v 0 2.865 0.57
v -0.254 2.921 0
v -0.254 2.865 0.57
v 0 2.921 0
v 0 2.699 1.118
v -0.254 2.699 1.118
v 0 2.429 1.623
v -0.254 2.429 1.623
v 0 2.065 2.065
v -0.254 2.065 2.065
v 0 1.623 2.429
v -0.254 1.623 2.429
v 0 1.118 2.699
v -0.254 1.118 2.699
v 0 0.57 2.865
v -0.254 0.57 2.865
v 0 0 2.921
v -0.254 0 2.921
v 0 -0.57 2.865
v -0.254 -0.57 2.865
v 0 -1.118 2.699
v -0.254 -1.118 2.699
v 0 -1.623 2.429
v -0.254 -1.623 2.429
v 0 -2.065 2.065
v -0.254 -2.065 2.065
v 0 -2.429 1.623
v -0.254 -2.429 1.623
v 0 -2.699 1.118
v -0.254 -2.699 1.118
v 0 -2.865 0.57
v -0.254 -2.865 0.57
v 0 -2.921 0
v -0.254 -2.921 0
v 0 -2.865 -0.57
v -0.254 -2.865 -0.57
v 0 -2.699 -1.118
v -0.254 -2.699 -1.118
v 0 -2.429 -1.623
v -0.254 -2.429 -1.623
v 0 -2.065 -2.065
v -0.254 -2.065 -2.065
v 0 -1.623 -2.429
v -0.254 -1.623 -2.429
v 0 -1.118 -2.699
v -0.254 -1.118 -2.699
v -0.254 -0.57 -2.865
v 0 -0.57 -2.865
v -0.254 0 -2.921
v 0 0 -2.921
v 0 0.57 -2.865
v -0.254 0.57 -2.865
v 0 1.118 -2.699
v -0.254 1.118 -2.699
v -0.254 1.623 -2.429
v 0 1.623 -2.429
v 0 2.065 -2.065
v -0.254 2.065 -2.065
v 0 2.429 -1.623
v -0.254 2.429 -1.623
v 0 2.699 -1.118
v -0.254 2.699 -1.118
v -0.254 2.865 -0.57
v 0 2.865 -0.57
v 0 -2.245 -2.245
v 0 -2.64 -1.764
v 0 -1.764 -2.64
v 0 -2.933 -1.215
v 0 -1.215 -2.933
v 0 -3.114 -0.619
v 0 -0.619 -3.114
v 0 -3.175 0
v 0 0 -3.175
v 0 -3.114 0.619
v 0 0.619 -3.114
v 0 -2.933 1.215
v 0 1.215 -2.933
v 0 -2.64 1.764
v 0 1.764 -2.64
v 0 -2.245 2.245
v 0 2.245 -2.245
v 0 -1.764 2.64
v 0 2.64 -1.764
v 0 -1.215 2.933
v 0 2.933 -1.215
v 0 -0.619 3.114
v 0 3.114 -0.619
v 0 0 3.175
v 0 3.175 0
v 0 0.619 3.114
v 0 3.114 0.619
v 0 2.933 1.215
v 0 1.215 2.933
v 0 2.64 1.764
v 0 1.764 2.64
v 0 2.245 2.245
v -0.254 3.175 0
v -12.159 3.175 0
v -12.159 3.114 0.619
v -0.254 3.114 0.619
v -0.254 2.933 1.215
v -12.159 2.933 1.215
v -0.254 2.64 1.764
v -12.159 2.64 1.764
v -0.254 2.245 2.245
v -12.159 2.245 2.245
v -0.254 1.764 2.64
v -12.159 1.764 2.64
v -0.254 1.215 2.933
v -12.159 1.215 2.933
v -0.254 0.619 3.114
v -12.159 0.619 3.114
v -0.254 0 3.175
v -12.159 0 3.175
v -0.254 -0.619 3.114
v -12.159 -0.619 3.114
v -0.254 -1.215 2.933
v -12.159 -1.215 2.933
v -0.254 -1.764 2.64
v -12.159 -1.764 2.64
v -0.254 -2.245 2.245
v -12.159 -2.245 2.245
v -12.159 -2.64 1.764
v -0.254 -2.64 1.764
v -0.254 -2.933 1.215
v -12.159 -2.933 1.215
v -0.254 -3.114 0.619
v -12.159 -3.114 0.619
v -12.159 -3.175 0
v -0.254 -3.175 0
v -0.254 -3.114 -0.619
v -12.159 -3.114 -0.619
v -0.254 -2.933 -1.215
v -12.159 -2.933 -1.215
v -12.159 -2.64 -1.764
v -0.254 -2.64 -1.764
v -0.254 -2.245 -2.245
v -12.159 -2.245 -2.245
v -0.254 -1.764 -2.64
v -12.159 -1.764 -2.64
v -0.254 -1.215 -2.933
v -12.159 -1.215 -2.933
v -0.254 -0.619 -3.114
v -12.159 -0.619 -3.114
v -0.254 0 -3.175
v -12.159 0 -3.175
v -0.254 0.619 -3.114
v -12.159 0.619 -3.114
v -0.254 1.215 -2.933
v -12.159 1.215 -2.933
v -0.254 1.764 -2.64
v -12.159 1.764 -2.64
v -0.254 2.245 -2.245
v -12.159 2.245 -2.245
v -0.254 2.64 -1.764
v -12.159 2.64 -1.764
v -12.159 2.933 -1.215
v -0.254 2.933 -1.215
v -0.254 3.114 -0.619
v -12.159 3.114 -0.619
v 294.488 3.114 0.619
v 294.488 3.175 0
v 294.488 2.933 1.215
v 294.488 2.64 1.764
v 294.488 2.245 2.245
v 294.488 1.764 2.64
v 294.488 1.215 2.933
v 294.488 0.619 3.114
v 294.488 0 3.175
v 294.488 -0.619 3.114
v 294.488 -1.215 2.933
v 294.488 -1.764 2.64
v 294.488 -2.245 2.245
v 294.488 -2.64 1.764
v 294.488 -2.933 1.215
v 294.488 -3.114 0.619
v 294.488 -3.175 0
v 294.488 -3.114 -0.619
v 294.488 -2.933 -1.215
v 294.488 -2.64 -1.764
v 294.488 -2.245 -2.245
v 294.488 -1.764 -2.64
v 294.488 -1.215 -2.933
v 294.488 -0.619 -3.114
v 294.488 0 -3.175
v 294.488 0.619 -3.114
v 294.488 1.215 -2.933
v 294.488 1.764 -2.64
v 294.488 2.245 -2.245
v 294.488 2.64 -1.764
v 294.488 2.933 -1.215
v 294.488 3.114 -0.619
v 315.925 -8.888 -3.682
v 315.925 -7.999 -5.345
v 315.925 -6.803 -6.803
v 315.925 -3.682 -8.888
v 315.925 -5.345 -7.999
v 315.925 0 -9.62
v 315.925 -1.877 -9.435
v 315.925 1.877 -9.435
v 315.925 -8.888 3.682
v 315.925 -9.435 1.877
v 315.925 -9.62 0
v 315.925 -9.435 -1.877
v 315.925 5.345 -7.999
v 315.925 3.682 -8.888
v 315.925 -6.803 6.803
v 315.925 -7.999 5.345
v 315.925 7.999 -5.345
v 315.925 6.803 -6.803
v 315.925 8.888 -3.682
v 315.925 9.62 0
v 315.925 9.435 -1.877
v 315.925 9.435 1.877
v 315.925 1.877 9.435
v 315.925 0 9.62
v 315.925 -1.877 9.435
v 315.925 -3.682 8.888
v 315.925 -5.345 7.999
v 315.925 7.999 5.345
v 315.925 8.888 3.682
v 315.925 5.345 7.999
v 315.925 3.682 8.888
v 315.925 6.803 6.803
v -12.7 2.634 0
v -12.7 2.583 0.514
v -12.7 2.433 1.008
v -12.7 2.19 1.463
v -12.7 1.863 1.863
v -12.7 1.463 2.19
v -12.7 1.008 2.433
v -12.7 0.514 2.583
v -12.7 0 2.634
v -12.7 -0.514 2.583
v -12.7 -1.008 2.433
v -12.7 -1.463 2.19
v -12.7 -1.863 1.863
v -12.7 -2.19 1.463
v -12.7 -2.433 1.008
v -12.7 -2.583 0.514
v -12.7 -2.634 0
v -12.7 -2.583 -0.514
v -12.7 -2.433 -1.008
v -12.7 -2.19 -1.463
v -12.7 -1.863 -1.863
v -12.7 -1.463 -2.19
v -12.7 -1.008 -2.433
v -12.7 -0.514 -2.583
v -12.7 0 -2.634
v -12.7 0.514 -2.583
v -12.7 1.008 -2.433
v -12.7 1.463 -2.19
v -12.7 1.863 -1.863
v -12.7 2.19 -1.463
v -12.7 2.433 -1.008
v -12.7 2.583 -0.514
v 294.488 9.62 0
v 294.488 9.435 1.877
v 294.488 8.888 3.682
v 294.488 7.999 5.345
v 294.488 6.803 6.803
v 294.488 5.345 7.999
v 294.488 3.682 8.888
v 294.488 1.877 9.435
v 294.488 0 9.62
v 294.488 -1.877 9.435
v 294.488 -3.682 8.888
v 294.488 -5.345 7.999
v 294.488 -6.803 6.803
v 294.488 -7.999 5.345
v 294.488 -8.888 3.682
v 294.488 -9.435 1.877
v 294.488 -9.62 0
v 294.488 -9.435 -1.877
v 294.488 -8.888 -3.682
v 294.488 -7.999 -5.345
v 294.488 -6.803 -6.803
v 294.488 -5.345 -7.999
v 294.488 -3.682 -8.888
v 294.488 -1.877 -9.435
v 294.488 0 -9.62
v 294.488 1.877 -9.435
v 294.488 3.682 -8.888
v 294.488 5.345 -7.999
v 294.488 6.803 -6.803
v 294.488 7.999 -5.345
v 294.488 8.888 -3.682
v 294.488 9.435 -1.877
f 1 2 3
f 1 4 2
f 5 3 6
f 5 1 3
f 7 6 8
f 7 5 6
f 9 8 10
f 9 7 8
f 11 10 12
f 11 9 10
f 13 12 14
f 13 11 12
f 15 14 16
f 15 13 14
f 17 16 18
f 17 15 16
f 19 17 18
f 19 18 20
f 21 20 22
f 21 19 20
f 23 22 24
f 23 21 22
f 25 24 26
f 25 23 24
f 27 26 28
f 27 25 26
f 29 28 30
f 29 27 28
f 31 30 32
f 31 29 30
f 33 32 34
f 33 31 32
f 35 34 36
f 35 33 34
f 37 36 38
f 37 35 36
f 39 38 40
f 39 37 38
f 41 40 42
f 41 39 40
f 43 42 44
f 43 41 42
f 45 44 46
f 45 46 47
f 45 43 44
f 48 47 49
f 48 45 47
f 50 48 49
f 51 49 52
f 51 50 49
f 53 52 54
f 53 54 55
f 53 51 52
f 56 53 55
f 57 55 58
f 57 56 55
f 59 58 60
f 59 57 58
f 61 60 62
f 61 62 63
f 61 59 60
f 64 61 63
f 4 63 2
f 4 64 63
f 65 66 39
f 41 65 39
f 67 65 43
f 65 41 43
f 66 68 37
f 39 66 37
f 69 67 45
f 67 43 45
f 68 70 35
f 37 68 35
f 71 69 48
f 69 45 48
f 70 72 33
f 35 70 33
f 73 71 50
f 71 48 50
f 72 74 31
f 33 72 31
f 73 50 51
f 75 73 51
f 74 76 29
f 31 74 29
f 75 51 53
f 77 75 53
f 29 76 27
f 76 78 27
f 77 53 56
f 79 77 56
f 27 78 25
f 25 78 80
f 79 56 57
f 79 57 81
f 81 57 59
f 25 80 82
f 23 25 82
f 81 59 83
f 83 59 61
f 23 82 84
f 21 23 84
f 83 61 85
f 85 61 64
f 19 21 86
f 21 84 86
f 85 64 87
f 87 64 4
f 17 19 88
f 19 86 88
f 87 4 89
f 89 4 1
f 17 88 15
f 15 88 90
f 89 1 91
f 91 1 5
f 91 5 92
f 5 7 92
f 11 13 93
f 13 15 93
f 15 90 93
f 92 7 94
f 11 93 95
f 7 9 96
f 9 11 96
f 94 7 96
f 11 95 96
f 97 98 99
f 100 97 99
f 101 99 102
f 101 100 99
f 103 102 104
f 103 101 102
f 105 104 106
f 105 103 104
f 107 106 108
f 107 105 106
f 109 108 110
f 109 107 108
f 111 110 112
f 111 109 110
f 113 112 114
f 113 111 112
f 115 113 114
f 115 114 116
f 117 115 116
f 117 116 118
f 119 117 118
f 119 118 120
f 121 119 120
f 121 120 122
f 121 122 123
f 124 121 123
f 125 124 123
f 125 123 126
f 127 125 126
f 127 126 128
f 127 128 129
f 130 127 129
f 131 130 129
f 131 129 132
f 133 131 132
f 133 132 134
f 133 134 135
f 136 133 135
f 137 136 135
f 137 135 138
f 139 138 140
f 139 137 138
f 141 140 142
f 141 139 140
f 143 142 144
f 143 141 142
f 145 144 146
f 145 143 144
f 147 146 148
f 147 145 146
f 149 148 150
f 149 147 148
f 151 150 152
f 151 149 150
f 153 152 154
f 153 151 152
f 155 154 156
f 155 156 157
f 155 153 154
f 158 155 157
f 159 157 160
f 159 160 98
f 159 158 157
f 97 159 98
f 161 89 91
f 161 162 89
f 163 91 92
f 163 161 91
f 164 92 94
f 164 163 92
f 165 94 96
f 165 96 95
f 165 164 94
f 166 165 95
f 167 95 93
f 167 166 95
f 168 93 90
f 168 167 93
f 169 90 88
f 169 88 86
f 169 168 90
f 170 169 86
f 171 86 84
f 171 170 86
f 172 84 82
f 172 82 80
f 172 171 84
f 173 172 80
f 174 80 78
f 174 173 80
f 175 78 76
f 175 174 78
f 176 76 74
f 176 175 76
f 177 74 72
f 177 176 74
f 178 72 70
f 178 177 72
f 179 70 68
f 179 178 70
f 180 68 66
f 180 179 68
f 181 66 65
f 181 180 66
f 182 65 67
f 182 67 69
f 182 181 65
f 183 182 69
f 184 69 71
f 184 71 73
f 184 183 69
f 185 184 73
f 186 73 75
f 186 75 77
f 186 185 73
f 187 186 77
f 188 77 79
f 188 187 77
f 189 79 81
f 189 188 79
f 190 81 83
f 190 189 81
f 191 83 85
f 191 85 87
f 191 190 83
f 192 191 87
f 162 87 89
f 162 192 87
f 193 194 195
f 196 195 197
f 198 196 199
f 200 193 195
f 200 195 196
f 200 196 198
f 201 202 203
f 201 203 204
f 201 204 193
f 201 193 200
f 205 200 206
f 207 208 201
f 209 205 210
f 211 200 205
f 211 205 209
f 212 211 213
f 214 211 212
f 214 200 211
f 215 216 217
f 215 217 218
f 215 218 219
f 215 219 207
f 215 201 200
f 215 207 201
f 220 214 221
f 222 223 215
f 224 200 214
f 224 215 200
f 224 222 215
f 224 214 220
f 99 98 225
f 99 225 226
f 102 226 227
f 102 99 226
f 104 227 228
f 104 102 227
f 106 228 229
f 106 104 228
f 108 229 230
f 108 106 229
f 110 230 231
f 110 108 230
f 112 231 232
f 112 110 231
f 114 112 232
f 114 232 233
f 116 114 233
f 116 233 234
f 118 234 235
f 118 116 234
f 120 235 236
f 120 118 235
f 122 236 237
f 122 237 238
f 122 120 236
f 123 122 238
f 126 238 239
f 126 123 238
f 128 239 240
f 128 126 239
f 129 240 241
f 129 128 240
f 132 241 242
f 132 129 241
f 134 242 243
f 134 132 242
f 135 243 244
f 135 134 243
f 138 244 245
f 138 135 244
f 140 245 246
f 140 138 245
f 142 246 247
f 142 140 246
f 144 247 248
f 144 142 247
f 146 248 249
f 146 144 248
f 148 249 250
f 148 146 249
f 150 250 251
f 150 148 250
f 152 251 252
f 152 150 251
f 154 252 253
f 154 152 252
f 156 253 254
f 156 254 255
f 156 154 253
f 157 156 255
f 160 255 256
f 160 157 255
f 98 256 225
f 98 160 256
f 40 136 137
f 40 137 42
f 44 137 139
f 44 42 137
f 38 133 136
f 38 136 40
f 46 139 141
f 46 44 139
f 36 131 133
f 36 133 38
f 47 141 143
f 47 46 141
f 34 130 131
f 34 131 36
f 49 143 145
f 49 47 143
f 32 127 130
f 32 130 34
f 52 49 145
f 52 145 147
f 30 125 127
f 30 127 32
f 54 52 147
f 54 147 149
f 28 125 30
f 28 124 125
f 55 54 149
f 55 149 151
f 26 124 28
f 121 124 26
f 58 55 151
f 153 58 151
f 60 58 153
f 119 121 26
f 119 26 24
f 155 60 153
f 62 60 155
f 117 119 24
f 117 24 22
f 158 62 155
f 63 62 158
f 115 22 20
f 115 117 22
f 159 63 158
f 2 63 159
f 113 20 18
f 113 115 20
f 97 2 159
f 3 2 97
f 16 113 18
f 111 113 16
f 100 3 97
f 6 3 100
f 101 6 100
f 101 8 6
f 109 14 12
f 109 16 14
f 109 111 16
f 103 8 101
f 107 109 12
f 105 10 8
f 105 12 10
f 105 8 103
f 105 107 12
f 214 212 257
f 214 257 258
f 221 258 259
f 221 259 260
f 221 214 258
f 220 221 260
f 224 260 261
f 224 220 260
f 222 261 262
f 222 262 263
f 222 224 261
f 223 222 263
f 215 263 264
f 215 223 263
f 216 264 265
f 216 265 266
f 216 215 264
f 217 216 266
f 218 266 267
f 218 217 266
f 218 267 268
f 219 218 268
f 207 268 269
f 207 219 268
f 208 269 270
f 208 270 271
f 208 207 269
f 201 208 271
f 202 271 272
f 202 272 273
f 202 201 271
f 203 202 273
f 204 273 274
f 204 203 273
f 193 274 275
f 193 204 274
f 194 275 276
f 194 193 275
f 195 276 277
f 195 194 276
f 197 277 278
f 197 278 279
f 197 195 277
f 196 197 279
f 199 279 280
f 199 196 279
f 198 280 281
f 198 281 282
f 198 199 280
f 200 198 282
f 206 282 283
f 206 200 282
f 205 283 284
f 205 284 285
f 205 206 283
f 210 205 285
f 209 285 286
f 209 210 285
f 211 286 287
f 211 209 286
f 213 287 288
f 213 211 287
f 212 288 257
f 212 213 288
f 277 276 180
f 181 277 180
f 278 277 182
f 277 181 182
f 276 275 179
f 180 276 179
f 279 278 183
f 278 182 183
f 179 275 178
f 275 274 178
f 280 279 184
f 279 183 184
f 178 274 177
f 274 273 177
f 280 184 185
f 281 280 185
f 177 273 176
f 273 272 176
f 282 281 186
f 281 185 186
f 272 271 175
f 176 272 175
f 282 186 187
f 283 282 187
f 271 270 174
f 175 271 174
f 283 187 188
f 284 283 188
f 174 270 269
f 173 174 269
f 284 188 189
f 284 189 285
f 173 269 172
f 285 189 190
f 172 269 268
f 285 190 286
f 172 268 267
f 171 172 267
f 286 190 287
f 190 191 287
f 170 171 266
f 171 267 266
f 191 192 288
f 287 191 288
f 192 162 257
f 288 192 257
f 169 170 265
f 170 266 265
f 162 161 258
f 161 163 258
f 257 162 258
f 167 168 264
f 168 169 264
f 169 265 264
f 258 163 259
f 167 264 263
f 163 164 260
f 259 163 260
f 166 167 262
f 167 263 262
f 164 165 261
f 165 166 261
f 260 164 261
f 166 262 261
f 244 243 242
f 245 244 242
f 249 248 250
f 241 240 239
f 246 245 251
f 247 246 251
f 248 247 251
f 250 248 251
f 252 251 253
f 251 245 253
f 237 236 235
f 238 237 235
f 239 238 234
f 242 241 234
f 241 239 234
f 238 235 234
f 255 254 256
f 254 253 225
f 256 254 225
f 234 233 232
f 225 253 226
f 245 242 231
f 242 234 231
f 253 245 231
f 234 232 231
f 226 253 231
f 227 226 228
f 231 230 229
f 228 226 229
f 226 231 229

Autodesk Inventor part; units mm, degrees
sketch "Sketch_1" plane through (0, 0, 0) normal (0, 0, 1) x (1, 0, 0)
  line L0 (315.9252, 0) -> (0, 0)
  line L1 (0, 0) -> (0, 3.175)
  line L2 (0, 3.175) -> (294.4876, 3.175)
  line L3 (294.4876, 3.175) -> (294.4876, 9.6203)
  line L4 (294.4876, 9.6203) -> (315.9252, 9.6203)
  line L5 (315.9252, 9.6203) -> (315.9252, 0)
  line L6 (315.9252, 0) -> (0, 0)
revolve "Revolution1" add sketch "Sketch_1" angle 360 about axis through (315.9252, 0, 0) along (1, 0, 0)
sketch "Sketch_3" plane through (0, 0, 0) normal (0, 0, 1) x (1, 0, 0)
  line L0 (0, 0) -> (-12.7, 0)
  line L1 (-12.7, 0) -> (-12.7, 2.634)
  line L2 (-12.7, 2.634) -> (-12.159, 3.175)
  line L3 (-12.159, 3.175) -> (0, 3.175)
  line L4 (0, 3.175) -> (0, 0)
  line L5 (0, 0) -> (-12.7, 0)
revolve "Revolution2" add sketch "Sketch_3" angle 360 about axis through (0, 0, 0) along (1, 0, 0)
thread "Thread1" size "1/4-28 UNF" class "2A" standard "ANSI Unified Screw Threads" length 12.159
sketch "Sketch_30" plane through (0, 0, 0) normal (0, 0, 1) x (1, 0, 0)
  line L0 (0, 0) -> (-0.254, 0)
  line L1 (-0.254, 2.921) -> (0, 2.921)
  line L2 (0, 2.921) -> (0, 3.429)
  line L3 (0, 3.429) -> (-0.254, 3.429)
  line L4 (-0.254, 3.429) -> (-0.254, 2.921)
revolve "Revolution3" cut sketch "Sketch_30" angle 360 about axis through (0, 0, 0) along (1, 0, 0)
ref_plane "dia1_XY" through (0, 3.175, 0) normal (1, 0, 0) x (0, 0, -1)
ref_plane "dia1_YZ" through (0, 3.175, 0) normal (0, 0, -1) x (0, 1, 0)
ref_plane "dia1_ZX" through (0, 3.175, 0) normal (0, 1, 0) x (1, 0, 0)
ref_plane "dia12_XY" through (0, 0, 10.9537) normal (1, 0, 0) x (0, 0, -1)
ref_plane "dia12_YZ" through (0, 0, 10.9537) normal (0, 0, -1) x (0, 1, 0)
ref_plane "dia12_ZX" through (0, 0, 10.9537) normal (0, 1, 0) x (1, 0, 0)
ref_plane "dia2_XY" through (0, -3.175, 0) normal (1, 0, 0) x (0, 0, -1)
ref_plane "dia2_YZ" through (0, -3.175, 0) normal (0, 0, -1) x (0, 1, 0)
ref_plane "dia2_ZX" through (0, -3.175, 0) normal (0, 1, 0) x (1, 0, 0)
ref_plane "dia22_XY" through (0, 0, -10.9537) normal (1, 0, 0) x (0, 0, -1)
ref_plane "dia22_YZ" through (0, 0, -10.9537) normal (0, 0, -1) x (0, 1, 0)
ref_plane "dia22_ZX" through (0, 0, -10.9537) normal (0, 1, 0) x (1, 0, 0)
ref_plane "rl1_XY" through (-12.7, 0, 0) normal (1, 0, 0) x (0, 0, -1)
ref_plane "rl1_YZ" through (-12.7, 0, 0) normal (0, 0, -1) x (0, 1, 0)
ref_plane "rl1_ZX" through (-12.7, 0, 0) normal (0, 1, 0) x (1, 0, 0)
ref_plane "rl2_XY" through (0, 0, 0) normal (1, 0, 0) x (0, 0, -1)
ref_plane "rl2_YZ" through (0, 0, 0) normal (0, 0, -1) x (0, 1, 0)
ref_plane "rl2_ZX" through (0, 0, 0) normal (0, 1, 0) x (1, 0, 0)
ref_plane "rod_cp_XY" through (0, 0, 0) normal (1, 0, 0) x (0, 0, -1)
ref_plane "rod_cp_YZ" through (0, 0, 0) normal (0, 0, -1) x (0, 1, 0)
ref_plane "rod_cp_ZX" through (0, 0, 0) normal (0, 1, 0) x (1, 0, 0)
ref_plane "thd1_XY" through (-12.7, 3.175, 0) normal (1, 0, 0) x (0, 0, -1)
ref_plane "thd1_YZ" through (-12.7, 3.175, 0) normal (0, 0, -1) x (0, 1, 0)
ref_plane "thd1_ZX" through (-12.7, 3.175, 0) normal (0, 1, 0) x (1, 0, 0)
ref_plane "thd2_XY" through (-12.7, -3.175, 0) normal (1, 0, 0) x (0, 0, -1)
ref_plane "thd2_YZ" through (-12.7, -3.175, 0) normal (0, 0, -1) x (0, 1, 0)
ref_plane "thd2_ZX" through (-12.7, -3.175, 0) normal (0, 1, 0) x (1, 0, 0)
ref_plane "to_rod_clevis_XY" through (-16.764, 0, 0) normal (1, 0, 0) x (0, 0, -1)
ref_plane "to_rod_clevis_YZ" through (-16.764, 0, 0) normal (0, 0, -1) x (0, 1, 0)
ref_plane "to_rod_clevis_ZX" through (-16.764, 0, 0) normal (0, 1, 0) x (1, 0, 0)
properties part number "C-0410-DP0_rod"
